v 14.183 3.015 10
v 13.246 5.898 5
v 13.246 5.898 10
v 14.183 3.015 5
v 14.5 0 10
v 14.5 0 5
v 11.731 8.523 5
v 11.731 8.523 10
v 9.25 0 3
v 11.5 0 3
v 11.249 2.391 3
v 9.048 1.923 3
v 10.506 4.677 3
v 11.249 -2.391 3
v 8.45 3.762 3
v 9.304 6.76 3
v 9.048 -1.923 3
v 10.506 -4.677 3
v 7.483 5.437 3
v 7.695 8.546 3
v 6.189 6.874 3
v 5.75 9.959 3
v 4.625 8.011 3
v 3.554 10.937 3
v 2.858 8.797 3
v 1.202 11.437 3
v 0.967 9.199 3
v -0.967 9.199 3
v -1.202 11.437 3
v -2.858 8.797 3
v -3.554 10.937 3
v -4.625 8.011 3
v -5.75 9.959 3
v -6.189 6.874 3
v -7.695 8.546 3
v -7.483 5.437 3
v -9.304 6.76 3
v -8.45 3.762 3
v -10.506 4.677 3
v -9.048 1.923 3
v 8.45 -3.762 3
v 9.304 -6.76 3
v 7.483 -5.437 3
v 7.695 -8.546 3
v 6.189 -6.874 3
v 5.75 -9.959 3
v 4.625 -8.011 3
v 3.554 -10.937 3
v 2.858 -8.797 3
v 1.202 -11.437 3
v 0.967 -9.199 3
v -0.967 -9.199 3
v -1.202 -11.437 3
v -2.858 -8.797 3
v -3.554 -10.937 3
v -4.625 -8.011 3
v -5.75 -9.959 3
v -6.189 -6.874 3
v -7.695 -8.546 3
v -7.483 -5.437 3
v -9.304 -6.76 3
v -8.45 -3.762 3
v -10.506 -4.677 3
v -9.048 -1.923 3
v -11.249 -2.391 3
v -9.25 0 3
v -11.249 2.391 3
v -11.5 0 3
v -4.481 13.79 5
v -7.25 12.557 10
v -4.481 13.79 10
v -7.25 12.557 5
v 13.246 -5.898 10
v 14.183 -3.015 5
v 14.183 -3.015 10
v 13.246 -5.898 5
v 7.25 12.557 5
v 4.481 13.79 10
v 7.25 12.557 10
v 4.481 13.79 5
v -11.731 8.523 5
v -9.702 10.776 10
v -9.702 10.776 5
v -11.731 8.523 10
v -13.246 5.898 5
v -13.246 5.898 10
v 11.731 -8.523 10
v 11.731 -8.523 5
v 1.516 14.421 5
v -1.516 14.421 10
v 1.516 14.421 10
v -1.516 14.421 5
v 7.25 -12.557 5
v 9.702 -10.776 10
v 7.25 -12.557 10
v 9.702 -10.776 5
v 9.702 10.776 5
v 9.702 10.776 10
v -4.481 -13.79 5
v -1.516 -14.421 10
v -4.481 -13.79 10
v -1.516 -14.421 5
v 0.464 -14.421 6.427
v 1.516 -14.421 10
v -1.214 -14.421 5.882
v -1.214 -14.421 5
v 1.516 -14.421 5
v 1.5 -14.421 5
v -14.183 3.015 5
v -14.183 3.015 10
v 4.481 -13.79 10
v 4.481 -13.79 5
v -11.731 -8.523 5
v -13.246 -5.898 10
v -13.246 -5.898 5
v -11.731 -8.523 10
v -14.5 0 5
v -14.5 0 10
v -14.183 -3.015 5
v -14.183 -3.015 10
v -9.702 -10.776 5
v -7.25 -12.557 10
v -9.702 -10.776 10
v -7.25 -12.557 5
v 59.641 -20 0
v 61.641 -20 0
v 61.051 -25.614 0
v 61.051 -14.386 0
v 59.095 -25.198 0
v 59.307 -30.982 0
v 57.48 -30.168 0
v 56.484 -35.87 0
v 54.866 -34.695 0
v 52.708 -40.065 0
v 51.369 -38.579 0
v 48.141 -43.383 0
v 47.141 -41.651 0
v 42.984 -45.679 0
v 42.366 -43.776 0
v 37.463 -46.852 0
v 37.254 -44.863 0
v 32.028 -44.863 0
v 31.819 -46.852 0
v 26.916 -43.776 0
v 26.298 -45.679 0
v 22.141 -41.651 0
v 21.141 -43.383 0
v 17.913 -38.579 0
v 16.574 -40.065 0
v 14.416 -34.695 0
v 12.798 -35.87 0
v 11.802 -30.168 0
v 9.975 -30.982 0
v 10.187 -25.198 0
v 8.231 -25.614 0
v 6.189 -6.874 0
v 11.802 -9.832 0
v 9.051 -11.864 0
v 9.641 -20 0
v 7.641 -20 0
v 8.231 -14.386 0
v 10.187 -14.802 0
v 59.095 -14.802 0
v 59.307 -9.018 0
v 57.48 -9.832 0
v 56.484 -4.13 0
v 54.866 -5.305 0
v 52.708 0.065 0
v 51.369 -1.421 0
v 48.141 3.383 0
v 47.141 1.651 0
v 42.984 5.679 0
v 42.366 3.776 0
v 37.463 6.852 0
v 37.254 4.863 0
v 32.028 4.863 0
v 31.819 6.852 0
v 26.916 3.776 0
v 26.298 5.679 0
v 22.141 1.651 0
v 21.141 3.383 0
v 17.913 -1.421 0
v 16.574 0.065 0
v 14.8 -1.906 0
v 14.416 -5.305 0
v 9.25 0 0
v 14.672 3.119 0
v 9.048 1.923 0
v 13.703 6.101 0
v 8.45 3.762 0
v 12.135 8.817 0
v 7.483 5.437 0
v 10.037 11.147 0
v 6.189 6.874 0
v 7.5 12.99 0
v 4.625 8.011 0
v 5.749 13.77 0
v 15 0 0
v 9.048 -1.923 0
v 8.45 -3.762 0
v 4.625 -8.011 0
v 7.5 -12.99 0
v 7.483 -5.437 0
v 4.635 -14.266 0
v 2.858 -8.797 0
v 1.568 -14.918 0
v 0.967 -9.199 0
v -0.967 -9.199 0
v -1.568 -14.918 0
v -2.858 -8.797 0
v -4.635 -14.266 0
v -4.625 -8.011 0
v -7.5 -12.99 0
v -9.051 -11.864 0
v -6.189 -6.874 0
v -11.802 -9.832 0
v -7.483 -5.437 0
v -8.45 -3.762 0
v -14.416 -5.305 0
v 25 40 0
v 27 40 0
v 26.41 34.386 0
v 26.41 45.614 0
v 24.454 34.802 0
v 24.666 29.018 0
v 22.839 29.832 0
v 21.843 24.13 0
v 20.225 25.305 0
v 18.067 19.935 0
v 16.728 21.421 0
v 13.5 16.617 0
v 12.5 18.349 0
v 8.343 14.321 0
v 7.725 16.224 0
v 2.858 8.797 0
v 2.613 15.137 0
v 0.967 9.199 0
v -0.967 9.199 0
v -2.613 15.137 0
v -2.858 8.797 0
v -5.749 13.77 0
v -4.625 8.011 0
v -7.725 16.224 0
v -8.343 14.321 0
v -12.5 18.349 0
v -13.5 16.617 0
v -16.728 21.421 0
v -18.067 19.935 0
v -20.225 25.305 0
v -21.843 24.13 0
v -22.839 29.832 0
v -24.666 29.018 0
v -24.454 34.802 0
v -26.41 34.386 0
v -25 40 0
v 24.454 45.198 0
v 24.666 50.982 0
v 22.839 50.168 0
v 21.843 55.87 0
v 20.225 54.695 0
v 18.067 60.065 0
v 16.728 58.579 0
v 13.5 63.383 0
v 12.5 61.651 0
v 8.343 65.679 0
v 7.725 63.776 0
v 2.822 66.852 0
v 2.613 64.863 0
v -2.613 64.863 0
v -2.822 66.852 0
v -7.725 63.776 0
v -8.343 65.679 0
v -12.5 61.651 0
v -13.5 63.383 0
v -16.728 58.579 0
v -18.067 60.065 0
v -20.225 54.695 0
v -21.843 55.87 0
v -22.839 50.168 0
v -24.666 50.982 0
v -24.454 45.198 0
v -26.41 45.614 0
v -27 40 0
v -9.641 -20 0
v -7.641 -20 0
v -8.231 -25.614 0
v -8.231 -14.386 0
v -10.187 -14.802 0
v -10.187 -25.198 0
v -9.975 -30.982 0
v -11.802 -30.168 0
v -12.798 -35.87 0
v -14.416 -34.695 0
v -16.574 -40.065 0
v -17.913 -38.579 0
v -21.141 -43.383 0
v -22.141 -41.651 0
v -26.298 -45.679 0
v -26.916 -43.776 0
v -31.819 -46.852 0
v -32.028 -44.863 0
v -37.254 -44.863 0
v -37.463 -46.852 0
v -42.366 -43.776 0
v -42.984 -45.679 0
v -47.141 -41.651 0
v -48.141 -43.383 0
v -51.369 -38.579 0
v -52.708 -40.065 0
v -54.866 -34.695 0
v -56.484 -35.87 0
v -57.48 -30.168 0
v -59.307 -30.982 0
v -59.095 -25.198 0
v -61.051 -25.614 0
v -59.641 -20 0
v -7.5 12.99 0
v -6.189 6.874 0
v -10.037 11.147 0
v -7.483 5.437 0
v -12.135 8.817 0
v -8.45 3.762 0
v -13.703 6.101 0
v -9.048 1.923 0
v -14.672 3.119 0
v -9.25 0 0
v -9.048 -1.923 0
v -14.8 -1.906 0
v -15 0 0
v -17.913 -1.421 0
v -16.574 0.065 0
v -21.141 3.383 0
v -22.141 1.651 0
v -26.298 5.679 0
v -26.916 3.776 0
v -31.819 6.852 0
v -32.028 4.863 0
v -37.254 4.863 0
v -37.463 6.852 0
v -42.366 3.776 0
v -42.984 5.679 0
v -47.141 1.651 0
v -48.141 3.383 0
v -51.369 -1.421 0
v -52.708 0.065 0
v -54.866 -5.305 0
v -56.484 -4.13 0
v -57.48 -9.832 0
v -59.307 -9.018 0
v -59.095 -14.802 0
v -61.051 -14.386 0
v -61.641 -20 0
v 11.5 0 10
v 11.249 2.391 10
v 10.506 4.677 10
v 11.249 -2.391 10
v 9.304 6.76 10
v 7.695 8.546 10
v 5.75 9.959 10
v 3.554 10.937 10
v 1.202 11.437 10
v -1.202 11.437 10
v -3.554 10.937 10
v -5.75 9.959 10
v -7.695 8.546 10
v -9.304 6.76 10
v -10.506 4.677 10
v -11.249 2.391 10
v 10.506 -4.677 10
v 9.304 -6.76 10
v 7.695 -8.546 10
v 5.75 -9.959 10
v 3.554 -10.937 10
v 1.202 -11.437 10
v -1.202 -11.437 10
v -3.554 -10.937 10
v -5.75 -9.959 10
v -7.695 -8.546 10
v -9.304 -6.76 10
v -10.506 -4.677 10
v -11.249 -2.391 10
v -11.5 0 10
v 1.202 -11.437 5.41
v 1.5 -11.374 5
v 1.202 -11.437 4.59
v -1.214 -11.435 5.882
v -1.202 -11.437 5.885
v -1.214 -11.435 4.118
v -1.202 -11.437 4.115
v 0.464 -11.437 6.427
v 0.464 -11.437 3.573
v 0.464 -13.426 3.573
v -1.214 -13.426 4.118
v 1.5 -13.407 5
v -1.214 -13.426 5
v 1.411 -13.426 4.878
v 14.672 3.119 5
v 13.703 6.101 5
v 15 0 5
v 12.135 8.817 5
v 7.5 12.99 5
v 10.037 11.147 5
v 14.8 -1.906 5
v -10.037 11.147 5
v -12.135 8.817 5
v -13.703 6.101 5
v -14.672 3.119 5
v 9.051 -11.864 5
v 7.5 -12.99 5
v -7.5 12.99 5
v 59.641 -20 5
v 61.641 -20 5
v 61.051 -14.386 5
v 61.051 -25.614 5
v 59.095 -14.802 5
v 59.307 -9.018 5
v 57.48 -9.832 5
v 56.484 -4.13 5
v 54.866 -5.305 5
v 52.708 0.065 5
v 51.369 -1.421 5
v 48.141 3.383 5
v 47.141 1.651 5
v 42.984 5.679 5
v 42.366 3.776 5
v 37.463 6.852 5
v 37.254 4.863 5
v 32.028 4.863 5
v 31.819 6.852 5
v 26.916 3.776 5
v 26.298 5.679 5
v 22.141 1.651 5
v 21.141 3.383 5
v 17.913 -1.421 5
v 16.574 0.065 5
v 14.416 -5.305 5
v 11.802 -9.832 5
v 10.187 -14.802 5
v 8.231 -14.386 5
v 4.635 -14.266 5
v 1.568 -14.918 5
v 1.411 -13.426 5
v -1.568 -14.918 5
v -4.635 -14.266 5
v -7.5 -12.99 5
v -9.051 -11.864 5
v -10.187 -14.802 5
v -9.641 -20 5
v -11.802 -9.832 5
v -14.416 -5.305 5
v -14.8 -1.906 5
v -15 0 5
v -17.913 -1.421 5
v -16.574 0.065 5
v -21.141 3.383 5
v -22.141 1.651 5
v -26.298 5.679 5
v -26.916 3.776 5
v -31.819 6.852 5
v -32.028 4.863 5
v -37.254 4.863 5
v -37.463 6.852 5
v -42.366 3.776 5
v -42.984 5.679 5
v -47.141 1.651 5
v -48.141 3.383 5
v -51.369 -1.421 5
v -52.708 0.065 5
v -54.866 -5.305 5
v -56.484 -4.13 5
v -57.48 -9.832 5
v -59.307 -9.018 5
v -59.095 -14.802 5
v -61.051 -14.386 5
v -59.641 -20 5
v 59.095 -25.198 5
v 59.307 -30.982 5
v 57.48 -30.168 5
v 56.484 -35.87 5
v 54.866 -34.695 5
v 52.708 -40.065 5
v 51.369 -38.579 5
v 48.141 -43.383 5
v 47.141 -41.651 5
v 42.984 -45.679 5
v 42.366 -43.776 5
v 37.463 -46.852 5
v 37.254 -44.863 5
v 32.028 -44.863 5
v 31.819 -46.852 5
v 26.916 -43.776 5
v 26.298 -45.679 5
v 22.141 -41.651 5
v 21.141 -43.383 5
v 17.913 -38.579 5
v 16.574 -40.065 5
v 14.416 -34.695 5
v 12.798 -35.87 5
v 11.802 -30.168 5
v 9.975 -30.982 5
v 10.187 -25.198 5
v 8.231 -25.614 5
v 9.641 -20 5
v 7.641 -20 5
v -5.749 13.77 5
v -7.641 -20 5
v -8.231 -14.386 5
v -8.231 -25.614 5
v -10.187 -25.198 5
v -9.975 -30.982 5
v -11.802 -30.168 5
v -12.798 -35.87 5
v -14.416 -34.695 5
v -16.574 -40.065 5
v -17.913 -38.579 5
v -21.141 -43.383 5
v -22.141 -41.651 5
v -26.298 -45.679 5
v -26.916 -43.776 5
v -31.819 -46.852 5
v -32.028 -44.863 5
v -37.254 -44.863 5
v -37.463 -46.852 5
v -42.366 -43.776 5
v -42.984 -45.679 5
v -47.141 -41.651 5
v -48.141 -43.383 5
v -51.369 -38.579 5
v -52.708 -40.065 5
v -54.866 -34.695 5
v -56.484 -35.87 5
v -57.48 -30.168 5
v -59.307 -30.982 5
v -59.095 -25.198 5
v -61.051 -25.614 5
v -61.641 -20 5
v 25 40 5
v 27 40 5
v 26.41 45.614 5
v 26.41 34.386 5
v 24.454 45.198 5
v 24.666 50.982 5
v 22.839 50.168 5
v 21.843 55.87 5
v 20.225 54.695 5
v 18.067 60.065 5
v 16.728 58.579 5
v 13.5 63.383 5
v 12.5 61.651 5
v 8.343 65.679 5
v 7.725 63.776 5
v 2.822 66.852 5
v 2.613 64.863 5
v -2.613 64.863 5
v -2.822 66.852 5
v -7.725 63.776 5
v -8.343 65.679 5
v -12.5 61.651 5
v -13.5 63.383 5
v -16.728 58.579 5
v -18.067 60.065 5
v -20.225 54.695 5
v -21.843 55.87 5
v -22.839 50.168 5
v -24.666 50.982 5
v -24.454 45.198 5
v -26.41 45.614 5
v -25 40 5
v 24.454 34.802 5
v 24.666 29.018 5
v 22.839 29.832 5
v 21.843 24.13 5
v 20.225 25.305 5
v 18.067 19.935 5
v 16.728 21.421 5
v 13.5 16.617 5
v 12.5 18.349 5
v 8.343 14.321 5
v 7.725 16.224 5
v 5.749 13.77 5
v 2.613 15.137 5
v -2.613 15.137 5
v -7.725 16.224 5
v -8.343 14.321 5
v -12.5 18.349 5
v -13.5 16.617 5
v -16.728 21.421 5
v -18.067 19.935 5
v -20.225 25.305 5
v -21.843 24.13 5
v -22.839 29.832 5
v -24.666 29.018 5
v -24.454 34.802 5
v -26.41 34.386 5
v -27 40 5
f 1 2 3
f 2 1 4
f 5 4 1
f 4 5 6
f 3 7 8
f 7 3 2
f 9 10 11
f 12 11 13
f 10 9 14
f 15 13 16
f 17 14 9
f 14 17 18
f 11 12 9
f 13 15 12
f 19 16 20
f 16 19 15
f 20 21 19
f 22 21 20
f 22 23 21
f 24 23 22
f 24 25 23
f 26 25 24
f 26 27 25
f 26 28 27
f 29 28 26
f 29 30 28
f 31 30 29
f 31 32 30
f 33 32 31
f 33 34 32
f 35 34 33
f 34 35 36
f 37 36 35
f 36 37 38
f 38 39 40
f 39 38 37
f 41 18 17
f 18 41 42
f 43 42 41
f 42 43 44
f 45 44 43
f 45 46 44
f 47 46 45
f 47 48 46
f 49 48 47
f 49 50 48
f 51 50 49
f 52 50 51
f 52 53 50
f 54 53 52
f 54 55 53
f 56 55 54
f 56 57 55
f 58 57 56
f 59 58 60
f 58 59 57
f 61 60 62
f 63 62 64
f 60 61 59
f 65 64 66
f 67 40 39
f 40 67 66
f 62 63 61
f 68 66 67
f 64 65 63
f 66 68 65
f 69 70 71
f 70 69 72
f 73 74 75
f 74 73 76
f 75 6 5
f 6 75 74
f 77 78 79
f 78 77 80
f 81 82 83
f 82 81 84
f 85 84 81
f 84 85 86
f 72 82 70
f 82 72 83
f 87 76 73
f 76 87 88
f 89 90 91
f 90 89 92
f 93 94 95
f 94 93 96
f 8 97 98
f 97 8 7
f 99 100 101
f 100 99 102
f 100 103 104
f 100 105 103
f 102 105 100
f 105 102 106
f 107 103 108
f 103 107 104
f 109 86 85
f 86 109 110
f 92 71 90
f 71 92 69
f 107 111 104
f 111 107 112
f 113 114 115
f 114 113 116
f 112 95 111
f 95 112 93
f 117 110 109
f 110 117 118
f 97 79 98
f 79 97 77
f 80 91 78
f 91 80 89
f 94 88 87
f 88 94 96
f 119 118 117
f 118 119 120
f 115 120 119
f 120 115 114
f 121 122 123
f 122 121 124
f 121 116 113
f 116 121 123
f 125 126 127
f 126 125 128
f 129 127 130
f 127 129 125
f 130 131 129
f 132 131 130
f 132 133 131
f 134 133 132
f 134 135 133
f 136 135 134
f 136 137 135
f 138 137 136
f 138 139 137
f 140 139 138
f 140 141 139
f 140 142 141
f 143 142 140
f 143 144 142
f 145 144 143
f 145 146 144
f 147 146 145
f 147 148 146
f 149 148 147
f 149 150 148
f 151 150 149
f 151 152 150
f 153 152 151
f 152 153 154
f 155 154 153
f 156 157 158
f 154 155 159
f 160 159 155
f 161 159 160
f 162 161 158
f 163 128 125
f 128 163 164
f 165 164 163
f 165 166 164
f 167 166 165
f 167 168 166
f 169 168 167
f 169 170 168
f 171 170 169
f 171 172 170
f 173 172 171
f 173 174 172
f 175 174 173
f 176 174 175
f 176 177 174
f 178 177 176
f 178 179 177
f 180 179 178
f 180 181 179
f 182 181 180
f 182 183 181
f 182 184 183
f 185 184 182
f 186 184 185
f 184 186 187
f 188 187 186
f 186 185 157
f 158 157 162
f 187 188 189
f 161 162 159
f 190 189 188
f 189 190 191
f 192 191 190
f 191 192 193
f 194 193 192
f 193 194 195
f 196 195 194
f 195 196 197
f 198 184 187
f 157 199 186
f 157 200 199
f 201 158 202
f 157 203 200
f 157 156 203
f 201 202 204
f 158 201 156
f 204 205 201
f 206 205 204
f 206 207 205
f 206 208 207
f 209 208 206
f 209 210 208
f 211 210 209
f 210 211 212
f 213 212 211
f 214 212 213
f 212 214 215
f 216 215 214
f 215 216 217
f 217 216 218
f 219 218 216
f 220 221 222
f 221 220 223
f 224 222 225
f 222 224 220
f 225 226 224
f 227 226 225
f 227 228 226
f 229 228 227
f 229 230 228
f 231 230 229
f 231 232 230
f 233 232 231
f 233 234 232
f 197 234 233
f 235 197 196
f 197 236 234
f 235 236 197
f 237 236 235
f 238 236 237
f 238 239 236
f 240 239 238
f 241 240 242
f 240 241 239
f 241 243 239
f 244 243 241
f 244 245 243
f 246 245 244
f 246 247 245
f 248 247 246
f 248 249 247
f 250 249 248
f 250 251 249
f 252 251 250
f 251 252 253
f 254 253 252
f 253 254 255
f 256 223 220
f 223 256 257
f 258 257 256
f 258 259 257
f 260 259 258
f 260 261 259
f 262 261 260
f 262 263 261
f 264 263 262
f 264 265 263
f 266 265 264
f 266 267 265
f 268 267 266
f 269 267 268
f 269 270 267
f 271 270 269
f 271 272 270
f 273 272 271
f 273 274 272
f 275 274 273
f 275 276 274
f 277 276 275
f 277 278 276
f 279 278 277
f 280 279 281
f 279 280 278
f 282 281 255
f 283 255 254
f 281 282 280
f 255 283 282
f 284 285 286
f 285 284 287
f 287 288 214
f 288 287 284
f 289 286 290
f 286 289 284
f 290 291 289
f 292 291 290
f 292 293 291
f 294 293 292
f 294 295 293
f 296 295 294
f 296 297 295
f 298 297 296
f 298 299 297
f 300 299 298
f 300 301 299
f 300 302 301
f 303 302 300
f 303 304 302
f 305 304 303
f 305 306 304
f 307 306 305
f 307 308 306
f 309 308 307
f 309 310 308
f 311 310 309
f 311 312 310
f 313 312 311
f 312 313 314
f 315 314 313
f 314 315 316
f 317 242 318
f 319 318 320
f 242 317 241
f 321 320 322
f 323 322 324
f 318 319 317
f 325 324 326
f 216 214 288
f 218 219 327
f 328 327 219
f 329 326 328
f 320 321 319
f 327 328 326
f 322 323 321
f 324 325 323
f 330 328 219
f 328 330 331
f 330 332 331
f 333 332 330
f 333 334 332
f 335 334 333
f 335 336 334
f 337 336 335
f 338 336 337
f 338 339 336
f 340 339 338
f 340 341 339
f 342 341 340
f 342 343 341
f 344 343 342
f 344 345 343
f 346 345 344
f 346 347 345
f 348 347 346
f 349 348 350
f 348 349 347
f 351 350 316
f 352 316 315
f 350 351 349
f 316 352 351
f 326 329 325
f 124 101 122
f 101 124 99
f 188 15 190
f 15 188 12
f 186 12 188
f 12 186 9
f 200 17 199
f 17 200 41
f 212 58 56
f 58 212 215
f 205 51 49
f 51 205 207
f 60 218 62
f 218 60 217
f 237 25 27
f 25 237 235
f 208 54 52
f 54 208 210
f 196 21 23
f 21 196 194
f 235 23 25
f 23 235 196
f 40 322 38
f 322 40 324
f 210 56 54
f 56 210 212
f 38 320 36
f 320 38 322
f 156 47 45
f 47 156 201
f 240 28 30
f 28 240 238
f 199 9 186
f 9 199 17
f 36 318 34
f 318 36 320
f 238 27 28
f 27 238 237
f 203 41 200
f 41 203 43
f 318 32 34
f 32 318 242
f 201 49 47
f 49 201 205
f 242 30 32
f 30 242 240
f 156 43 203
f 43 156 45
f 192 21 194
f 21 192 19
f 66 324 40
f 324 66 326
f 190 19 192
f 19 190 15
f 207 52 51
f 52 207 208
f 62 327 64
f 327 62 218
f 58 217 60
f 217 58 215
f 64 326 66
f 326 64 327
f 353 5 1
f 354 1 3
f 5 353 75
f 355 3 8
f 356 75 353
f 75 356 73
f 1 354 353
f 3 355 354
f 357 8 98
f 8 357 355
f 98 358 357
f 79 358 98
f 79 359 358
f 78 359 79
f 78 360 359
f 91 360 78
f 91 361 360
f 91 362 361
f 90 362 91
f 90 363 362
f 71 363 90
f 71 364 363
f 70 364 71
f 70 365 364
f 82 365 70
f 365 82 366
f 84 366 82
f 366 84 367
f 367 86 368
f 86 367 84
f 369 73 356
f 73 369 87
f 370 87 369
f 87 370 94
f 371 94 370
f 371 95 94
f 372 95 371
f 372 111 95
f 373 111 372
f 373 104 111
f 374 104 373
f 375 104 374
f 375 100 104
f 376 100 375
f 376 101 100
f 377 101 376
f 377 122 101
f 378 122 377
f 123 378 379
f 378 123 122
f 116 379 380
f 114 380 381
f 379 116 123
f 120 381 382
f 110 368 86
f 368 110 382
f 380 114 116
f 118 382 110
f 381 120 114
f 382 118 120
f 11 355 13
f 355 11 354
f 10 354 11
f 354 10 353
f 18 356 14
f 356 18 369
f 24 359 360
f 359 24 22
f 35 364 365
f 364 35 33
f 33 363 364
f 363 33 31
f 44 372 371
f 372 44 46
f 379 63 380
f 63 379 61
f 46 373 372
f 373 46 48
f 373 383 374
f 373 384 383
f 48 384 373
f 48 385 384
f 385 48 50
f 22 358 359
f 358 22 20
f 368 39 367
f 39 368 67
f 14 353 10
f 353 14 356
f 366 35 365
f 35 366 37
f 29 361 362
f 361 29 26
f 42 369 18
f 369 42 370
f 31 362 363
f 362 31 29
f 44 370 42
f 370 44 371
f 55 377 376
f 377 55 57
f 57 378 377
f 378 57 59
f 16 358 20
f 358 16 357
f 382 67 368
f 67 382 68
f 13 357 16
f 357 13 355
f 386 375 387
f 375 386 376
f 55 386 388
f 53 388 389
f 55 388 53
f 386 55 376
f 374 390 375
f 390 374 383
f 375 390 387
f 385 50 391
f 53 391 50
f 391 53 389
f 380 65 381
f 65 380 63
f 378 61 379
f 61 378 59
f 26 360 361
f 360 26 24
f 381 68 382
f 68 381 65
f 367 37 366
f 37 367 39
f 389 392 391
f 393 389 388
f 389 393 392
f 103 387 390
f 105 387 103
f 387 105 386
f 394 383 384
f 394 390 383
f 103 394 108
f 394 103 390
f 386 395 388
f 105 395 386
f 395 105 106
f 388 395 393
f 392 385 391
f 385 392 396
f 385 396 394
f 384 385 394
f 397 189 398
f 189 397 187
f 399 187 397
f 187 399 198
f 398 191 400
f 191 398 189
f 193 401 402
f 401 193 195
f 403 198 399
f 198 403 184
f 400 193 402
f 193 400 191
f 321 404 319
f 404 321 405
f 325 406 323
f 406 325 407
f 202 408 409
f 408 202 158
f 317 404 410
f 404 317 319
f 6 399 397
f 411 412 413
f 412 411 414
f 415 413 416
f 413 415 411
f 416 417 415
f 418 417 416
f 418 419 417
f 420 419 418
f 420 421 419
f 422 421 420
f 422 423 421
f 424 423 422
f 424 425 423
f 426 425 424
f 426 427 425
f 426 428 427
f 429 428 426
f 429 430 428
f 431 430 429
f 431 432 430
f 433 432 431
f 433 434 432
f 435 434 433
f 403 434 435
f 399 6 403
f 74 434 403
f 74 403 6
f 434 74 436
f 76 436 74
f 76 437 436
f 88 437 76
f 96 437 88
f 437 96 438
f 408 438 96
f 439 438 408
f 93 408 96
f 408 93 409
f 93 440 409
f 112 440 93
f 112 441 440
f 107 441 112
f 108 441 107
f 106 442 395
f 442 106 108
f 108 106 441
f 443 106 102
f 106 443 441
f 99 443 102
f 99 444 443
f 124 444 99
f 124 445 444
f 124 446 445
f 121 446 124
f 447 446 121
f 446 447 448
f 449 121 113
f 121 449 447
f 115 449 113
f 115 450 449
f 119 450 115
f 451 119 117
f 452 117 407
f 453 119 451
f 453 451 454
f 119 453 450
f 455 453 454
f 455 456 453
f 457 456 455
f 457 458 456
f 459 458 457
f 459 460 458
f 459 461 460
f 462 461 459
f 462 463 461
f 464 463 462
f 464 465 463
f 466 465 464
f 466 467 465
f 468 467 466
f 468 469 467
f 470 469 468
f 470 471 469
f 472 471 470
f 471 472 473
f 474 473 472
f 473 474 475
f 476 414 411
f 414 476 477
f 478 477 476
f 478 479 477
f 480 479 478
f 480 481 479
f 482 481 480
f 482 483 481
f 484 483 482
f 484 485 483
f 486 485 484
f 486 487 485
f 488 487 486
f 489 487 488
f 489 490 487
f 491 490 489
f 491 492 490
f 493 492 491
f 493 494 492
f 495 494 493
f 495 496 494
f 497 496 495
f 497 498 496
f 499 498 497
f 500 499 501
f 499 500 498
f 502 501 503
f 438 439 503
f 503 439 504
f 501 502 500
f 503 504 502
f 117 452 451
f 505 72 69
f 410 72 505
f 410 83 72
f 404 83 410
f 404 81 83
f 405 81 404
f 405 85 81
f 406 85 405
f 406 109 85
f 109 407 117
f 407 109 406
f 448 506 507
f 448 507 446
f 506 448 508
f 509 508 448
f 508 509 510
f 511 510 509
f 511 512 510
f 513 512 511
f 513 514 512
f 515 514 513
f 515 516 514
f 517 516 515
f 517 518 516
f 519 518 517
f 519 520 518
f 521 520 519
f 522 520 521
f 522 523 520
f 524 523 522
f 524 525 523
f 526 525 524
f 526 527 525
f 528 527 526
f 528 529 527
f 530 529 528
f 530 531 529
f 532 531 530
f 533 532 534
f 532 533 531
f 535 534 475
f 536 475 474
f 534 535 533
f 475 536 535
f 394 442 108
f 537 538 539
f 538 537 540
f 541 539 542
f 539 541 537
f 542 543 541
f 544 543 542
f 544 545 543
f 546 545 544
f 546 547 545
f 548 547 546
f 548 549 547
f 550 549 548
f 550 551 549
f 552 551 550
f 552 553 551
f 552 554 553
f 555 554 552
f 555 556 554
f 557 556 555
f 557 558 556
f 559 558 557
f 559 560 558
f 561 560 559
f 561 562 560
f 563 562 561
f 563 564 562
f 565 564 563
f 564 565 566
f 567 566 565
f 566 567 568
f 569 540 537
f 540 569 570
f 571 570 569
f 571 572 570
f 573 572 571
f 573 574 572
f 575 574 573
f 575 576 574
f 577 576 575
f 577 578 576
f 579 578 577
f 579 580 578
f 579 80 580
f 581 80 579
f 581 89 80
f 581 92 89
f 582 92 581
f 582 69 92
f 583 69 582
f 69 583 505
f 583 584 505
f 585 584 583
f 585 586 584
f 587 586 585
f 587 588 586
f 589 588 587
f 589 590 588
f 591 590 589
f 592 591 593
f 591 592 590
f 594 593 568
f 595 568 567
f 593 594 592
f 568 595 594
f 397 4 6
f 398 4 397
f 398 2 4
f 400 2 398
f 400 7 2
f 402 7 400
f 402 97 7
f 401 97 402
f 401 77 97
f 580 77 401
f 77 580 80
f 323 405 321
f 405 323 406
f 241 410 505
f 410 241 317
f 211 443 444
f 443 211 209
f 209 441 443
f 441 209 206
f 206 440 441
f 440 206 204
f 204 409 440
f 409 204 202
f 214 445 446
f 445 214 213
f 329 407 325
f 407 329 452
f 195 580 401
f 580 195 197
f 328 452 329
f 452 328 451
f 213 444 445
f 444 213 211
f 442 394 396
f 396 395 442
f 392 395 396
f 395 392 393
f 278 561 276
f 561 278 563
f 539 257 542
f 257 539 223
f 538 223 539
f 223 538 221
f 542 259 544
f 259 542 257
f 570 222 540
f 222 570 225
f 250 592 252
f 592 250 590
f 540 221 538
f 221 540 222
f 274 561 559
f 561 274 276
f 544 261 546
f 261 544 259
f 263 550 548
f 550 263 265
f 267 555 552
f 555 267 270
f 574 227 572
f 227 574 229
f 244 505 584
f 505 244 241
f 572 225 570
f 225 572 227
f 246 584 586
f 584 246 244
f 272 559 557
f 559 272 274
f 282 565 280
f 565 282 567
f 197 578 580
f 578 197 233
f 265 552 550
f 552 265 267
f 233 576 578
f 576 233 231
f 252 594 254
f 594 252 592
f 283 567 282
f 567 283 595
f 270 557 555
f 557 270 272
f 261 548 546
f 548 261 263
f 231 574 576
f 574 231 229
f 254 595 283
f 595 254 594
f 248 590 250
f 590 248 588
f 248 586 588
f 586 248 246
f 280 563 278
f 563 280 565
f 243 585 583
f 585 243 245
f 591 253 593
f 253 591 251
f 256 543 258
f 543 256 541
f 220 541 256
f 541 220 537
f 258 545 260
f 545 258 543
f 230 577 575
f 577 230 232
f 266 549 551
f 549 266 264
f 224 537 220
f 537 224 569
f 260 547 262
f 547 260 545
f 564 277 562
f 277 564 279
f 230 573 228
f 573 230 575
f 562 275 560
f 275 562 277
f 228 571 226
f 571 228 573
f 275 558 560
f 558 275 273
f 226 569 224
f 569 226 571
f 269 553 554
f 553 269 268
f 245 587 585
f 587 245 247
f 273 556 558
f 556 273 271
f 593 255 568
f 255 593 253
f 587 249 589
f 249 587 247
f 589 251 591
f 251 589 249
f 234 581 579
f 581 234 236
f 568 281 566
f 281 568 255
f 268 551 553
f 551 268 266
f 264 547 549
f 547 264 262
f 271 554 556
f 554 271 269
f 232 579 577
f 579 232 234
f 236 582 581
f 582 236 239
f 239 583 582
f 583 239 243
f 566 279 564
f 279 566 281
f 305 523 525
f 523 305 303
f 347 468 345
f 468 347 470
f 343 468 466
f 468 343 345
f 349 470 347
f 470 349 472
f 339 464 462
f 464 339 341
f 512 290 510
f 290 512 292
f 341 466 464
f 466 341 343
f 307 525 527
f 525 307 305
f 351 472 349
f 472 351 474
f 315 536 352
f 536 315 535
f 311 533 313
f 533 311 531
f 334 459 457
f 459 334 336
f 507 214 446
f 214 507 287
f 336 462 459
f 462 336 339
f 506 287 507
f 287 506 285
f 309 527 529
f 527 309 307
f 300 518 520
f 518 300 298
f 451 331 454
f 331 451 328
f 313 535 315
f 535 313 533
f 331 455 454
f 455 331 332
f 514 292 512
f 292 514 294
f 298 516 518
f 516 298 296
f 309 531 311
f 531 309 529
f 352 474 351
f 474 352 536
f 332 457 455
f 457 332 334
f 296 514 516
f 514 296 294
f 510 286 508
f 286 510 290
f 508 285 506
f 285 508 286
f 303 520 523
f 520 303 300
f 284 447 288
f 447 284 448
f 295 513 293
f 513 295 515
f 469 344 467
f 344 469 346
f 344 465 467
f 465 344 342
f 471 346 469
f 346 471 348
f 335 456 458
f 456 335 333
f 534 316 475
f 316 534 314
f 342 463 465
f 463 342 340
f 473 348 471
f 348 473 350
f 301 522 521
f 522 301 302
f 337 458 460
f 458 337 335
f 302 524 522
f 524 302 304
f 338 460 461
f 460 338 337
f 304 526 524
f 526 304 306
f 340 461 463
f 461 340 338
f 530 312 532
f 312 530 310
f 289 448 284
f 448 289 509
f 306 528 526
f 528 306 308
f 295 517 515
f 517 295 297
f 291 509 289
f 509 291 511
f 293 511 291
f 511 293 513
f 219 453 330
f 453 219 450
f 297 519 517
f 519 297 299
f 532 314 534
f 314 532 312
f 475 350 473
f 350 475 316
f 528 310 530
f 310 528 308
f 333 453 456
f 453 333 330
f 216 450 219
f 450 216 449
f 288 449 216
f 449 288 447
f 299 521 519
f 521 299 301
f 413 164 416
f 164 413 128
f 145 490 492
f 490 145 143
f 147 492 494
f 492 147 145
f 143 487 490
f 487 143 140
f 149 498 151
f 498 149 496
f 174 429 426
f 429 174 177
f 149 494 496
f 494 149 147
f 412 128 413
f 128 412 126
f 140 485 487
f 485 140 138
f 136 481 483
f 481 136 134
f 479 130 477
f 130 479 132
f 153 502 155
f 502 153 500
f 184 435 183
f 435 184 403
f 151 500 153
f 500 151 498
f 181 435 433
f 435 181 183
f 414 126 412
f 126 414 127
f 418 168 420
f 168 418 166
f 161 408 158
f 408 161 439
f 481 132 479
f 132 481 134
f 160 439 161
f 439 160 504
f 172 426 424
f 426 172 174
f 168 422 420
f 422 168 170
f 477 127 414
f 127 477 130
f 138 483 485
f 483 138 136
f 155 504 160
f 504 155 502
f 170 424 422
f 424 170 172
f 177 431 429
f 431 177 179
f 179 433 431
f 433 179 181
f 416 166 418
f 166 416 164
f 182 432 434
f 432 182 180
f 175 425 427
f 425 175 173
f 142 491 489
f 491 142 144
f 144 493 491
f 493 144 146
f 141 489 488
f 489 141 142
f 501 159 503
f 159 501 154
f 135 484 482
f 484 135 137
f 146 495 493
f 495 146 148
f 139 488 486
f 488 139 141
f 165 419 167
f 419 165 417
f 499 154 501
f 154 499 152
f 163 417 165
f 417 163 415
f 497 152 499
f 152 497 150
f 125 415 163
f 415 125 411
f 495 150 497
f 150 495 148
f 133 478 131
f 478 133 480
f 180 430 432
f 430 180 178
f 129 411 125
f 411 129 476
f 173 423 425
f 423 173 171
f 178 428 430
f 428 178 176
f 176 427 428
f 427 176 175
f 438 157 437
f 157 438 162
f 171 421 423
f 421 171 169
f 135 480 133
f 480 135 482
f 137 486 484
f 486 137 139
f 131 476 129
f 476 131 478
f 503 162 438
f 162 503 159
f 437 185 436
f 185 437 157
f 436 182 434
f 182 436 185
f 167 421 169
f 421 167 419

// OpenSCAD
union() {
	difference() {
		union() {
			difference() {
				cylinder(d = 29, h = 3);
				translate(v = [0, 0, -1.5000000000]) {
					cylinder(d = 18.5000000000, h = 6);
				}
			}
			difference() {
				cylinder(d = 29, h = 10);
				translate(v = [0, 0, -5.0000000000]) {
					cylinder(d = 23, h = 20);
				}
			}
		}
		translate(v = [0, 0, 5.0000000000]) {
			rotate(a = [90, 0, 0]) {
				cylinder(d = 3, h = 30);
			}
		}
	}
	difference() {
		cylinder(d = 30, h = 5);
		translate(v = [0, 0, -2.5000000000]) {
			cylinder(d = 27, h = 10);
		}
	}
	translate(v = [0, 40.0000000000, 0]) {
		difference() {
			cylinder(d = 54, h = 5);
			translate(v = [0, 0, -2.5000000000]) {
				cylinder(d = 50, h = 10);
			}
		}
	}
	rotate(a = [0, 0, 0.0000000000]) {
		translate(v = [0, 40.0000000000, 0]) {
			difference() {
				cylinder(d = 54, h = 5);
				translate(v = [0, 0, -2.5000000000]) {
					cylinder(d = 50, h = 10);
				}
			}
		}
	}
	rotate(a = [0, 0, 120.0000000000]) {
		translate(v = [0, 40.0000000000, 0]) {
			difference() {
				cylinder(d = 54, h = 5);
				translate(v = [0, 0, -2.5000000000]) {
					cylinder(d = 50, h = 10);
				}
			}
		}
	}
	rotate(a = [0, 0, 240.0000000000]) {
		translate(v = [0, 40.0000000000, 0]) {
			difference() {
				cylinder(d = 54, h = 5);
				translate(v = [0, 0, -2.5000000000]) {
					cylinder(d = 50, h = 10);
				}
			}
		}
	}
}
